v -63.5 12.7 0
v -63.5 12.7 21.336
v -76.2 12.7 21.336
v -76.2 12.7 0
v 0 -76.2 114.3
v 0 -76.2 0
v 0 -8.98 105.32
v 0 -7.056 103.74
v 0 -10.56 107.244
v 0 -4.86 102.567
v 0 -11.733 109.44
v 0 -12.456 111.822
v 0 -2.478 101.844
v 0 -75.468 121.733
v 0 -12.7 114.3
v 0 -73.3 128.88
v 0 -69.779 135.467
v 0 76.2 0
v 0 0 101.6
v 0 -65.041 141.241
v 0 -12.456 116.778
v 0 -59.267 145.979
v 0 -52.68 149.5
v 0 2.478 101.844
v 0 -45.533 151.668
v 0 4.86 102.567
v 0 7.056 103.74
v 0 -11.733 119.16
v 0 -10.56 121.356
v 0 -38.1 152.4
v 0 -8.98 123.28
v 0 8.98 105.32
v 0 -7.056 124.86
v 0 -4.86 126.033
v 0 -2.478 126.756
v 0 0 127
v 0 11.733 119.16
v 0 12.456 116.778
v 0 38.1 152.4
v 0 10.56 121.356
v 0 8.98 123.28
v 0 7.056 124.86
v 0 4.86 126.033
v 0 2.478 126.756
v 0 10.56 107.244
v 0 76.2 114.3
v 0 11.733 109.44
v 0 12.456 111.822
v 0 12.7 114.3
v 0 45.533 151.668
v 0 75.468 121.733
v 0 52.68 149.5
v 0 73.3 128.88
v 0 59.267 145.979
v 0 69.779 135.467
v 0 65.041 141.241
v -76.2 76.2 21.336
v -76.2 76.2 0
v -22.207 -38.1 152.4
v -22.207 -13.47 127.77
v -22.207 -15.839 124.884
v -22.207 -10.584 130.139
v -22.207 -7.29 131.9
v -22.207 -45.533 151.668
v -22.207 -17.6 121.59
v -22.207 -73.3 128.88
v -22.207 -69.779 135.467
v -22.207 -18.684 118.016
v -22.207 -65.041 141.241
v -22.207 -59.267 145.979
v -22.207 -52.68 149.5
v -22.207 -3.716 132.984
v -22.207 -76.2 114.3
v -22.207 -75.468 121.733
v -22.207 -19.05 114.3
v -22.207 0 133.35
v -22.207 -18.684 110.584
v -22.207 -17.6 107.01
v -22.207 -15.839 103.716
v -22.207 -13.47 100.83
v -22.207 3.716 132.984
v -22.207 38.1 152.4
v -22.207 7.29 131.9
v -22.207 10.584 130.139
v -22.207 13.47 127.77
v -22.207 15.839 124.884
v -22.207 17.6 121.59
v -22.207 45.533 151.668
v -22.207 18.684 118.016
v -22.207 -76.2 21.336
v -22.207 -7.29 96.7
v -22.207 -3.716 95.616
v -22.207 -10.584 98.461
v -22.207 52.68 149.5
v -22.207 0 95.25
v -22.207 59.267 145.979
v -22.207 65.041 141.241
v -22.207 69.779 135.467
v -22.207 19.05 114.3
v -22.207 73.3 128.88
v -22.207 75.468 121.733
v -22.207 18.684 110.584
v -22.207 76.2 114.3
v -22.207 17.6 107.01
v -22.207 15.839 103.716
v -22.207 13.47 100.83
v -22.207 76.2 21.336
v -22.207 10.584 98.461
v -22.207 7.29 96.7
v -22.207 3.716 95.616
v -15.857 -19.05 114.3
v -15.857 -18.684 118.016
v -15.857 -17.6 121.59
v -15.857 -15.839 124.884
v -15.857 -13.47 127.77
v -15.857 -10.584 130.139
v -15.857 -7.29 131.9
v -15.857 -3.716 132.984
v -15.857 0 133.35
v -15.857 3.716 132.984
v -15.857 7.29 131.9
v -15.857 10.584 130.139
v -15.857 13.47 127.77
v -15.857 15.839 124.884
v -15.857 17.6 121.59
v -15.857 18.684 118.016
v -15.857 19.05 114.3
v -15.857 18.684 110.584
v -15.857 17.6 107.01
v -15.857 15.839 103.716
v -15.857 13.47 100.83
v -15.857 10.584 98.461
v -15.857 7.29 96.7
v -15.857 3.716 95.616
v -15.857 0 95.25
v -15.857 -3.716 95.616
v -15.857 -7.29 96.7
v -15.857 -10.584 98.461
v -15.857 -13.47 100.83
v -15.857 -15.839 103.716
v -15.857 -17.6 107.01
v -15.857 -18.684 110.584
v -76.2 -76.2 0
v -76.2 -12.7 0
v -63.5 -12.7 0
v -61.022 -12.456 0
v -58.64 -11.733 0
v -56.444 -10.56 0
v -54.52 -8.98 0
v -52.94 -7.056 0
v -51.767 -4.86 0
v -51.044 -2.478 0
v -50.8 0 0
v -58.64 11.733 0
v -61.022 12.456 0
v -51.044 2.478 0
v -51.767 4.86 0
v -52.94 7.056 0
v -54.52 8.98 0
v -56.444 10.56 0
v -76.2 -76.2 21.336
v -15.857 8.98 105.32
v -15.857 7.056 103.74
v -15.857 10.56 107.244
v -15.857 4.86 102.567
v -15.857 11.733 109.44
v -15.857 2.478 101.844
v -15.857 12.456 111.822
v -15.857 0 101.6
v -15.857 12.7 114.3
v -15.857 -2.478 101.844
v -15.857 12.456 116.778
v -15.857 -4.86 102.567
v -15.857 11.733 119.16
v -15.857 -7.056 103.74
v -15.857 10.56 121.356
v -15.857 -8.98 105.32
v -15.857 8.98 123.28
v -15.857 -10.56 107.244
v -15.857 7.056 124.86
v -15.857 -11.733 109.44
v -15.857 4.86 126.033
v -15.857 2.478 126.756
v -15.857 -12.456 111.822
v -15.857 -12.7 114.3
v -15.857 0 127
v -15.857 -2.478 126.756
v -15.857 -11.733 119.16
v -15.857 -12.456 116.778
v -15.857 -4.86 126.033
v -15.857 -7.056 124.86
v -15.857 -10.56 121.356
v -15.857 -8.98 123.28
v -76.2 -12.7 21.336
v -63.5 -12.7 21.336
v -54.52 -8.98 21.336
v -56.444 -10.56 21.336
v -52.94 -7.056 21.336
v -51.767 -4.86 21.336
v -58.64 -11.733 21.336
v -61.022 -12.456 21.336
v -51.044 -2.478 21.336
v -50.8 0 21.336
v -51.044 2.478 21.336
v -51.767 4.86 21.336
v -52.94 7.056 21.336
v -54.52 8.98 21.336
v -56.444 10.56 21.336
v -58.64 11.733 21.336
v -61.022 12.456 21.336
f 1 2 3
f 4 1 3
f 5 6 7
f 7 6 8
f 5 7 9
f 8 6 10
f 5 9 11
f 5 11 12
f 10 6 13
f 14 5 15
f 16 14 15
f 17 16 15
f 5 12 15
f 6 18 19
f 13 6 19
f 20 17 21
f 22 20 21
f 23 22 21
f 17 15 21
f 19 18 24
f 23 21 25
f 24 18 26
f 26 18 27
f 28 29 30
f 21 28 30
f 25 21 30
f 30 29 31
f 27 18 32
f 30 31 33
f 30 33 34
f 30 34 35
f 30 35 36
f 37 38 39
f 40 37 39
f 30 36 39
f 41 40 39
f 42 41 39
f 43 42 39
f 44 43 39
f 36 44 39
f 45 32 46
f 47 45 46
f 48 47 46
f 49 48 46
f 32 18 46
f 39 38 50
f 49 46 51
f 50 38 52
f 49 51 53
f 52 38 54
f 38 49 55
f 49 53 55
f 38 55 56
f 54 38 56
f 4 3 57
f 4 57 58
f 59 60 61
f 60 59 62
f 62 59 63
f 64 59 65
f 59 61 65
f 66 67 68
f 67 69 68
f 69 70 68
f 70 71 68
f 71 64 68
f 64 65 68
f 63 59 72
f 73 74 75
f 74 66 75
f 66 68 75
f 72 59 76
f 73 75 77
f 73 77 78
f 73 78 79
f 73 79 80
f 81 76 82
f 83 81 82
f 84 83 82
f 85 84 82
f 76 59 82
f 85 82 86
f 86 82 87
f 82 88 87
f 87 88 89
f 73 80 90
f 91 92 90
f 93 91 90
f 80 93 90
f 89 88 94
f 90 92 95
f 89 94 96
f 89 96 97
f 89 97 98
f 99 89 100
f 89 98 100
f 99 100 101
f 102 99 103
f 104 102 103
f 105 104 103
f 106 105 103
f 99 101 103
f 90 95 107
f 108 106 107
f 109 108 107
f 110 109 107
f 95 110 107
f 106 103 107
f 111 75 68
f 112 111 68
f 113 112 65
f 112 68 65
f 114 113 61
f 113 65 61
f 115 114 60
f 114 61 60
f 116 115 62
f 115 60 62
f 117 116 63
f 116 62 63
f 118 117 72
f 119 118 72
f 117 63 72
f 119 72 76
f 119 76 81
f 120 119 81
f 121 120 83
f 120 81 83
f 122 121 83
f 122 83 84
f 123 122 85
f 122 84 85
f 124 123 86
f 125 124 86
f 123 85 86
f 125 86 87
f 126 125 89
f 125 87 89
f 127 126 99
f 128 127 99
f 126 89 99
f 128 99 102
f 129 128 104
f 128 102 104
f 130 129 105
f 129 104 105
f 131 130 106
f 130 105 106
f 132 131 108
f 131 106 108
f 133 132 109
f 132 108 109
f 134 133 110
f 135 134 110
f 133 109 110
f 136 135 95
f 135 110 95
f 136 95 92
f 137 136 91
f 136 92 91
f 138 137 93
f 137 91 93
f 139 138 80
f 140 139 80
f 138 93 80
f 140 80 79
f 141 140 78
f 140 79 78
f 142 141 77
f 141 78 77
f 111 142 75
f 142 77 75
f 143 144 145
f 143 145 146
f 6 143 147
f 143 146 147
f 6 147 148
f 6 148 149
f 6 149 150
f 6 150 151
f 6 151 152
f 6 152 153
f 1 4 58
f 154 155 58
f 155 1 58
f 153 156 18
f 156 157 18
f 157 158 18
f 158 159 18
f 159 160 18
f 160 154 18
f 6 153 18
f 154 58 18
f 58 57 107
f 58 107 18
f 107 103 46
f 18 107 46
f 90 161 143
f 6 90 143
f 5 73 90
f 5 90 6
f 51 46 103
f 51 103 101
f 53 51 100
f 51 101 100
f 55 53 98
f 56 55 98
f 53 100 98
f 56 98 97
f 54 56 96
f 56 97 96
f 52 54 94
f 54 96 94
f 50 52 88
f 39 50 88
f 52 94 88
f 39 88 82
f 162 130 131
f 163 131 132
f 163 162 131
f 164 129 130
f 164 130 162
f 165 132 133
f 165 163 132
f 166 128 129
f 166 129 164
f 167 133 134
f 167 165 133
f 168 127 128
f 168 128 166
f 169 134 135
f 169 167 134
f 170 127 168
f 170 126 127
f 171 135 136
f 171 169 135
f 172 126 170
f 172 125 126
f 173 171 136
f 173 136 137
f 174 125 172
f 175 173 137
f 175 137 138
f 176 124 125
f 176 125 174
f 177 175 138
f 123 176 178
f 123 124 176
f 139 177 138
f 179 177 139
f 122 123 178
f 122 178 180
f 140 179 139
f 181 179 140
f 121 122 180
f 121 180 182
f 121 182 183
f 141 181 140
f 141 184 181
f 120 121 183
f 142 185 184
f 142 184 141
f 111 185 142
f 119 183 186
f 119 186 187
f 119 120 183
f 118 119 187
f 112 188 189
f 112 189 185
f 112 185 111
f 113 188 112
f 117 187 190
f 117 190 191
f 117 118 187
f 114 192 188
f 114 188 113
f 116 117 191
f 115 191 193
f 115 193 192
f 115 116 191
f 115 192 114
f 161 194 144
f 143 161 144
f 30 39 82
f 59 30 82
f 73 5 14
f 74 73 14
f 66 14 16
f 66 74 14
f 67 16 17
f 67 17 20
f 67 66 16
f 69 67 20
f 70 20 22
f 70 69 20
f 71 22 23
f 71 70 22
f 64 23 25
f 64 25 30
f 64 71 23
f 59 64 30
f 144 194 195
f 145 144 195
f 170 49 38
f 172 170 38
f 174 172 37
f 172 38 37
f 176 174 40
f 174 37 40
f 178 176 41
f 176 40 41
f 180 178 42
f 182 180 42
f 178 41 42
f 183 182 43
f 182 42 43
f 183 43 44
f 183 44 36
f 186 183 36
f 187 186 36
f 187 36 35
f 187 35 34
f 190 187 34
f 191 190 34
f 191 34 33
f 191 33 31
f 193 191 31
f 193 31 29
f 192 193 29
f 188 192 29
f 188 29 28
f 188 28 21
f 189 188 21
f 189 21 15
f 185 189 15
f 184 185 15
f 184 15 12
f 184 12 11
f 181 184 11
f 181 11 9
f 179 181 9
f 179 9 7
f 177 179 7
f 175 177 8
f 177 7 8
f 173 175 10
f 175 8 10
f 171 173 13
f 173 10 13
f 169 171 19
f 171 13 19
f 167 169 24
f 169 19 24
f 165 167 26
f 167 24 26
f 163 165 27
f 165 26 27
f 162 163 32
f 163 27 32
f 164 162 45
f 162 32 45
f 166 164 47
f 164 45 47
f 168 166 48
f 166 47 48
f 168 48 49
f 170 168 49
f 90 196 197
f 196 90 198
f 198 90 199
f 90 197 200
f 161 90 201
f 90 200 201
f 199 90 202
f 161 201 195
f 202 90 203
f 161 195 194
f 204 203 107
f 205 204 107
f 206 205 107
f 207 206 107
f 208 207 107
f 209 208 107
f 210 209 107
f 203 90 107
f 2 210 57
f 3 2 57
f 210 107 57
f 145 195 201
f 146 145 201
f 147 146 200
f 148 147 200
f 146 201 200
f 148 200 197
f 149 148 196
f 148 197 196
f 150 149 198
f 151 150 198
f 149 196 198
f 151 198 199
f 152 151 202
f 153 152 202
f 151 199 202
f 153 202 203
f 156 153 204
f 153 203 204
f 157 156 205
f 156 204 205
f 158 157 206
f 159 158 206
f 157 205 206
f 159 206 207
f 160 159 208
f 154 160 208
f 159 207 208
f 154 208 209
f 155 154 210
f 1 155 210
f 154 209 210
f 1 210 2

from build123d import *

# Parameters (mm, degrees)
F1_DEPTH = 76.2
F2_DEPTH = 76.2
F3_R     = 12.7
F4_DEPTH = 76.201
F6_DEPTH = 25.4
F7_R     = 38.1
F8_R     = 19.05
F9_DEPTH = 6.35


with BuildPart() as f1:
    # F0 (on Front) → F1 (new body)
    with BuildSketch(Plane.XZ):
        Polygon((-76.2, 0), (0, 0), (0, 152.4), (-22.206856, 152.4), (-22.206856, 21.336), (-76.2, 21.336), align=None)
    extrude(amount=-F1_DEPTH)

    # F1_face (on face) → F2 (join)
    with BuildSketch(Plane(origin=(-20.778911, 0, 59.558169), x_dir=(1, 0, 0), z_dir=(0, -1, 0))):
        Polygon((-1.427945, -38.222169), (-55.421089, -38.222169), (-55.421089, -59.558169), (20.778911, -59.558169), (20.778911, 92.841831), (-1.427945, 92.841831), align=None)
    extrude(amount=F2_DEPTH)

    # F3 (on face) → F4 (cut, through all)
    with BuildSketch(Plane.YZ):
        with Locations((0, 114.3)):
            Circle(F3_R)
    extrude(amount=-F4_DEPTH, mode=Mode.SUBTRACT)

    # F5 (on face) → F6 (cut)
    with BuildSketch(Plane.XY.offset(21.336)):
        with BuildLine():
            Line((-63.5, 12.7), (-76.2, 12.7))
            Line((-76.2, 12.7), (-76.2, -12.7))
            Line((-76.2, -12.7), (-63.5, -12.7))
            ThreePointArc((-63.5, -12.7), (-50.8, 0), (-63.5, 12.7))
        make_face()
    extrude(amount=-F6_DEPTH, mode=Mode.SUBTRACT)

    # F7
    f7_edges = [f1.edges().sort_by_distance(p)[0] for p in [
        (-11.103428, -76.2, 152.4),
        (-11.103428, 76.2, 152.4),
    ]]
    fillet(f7_edges, radius=F7_R)

    # F8 (on face) → F9 (cut)
    with BuildSketch(Plane(origin=(-22.206856, 0, 0), x_dir=(0, -1, 0), z_dir=(-1, 0, 0))):
        with Locations((0, 114.3)):
            Circle(F8_R)
    extrude(amount=-F9_DEPTH, mode=Mode.SUBTRACT)


solid = f1.part
